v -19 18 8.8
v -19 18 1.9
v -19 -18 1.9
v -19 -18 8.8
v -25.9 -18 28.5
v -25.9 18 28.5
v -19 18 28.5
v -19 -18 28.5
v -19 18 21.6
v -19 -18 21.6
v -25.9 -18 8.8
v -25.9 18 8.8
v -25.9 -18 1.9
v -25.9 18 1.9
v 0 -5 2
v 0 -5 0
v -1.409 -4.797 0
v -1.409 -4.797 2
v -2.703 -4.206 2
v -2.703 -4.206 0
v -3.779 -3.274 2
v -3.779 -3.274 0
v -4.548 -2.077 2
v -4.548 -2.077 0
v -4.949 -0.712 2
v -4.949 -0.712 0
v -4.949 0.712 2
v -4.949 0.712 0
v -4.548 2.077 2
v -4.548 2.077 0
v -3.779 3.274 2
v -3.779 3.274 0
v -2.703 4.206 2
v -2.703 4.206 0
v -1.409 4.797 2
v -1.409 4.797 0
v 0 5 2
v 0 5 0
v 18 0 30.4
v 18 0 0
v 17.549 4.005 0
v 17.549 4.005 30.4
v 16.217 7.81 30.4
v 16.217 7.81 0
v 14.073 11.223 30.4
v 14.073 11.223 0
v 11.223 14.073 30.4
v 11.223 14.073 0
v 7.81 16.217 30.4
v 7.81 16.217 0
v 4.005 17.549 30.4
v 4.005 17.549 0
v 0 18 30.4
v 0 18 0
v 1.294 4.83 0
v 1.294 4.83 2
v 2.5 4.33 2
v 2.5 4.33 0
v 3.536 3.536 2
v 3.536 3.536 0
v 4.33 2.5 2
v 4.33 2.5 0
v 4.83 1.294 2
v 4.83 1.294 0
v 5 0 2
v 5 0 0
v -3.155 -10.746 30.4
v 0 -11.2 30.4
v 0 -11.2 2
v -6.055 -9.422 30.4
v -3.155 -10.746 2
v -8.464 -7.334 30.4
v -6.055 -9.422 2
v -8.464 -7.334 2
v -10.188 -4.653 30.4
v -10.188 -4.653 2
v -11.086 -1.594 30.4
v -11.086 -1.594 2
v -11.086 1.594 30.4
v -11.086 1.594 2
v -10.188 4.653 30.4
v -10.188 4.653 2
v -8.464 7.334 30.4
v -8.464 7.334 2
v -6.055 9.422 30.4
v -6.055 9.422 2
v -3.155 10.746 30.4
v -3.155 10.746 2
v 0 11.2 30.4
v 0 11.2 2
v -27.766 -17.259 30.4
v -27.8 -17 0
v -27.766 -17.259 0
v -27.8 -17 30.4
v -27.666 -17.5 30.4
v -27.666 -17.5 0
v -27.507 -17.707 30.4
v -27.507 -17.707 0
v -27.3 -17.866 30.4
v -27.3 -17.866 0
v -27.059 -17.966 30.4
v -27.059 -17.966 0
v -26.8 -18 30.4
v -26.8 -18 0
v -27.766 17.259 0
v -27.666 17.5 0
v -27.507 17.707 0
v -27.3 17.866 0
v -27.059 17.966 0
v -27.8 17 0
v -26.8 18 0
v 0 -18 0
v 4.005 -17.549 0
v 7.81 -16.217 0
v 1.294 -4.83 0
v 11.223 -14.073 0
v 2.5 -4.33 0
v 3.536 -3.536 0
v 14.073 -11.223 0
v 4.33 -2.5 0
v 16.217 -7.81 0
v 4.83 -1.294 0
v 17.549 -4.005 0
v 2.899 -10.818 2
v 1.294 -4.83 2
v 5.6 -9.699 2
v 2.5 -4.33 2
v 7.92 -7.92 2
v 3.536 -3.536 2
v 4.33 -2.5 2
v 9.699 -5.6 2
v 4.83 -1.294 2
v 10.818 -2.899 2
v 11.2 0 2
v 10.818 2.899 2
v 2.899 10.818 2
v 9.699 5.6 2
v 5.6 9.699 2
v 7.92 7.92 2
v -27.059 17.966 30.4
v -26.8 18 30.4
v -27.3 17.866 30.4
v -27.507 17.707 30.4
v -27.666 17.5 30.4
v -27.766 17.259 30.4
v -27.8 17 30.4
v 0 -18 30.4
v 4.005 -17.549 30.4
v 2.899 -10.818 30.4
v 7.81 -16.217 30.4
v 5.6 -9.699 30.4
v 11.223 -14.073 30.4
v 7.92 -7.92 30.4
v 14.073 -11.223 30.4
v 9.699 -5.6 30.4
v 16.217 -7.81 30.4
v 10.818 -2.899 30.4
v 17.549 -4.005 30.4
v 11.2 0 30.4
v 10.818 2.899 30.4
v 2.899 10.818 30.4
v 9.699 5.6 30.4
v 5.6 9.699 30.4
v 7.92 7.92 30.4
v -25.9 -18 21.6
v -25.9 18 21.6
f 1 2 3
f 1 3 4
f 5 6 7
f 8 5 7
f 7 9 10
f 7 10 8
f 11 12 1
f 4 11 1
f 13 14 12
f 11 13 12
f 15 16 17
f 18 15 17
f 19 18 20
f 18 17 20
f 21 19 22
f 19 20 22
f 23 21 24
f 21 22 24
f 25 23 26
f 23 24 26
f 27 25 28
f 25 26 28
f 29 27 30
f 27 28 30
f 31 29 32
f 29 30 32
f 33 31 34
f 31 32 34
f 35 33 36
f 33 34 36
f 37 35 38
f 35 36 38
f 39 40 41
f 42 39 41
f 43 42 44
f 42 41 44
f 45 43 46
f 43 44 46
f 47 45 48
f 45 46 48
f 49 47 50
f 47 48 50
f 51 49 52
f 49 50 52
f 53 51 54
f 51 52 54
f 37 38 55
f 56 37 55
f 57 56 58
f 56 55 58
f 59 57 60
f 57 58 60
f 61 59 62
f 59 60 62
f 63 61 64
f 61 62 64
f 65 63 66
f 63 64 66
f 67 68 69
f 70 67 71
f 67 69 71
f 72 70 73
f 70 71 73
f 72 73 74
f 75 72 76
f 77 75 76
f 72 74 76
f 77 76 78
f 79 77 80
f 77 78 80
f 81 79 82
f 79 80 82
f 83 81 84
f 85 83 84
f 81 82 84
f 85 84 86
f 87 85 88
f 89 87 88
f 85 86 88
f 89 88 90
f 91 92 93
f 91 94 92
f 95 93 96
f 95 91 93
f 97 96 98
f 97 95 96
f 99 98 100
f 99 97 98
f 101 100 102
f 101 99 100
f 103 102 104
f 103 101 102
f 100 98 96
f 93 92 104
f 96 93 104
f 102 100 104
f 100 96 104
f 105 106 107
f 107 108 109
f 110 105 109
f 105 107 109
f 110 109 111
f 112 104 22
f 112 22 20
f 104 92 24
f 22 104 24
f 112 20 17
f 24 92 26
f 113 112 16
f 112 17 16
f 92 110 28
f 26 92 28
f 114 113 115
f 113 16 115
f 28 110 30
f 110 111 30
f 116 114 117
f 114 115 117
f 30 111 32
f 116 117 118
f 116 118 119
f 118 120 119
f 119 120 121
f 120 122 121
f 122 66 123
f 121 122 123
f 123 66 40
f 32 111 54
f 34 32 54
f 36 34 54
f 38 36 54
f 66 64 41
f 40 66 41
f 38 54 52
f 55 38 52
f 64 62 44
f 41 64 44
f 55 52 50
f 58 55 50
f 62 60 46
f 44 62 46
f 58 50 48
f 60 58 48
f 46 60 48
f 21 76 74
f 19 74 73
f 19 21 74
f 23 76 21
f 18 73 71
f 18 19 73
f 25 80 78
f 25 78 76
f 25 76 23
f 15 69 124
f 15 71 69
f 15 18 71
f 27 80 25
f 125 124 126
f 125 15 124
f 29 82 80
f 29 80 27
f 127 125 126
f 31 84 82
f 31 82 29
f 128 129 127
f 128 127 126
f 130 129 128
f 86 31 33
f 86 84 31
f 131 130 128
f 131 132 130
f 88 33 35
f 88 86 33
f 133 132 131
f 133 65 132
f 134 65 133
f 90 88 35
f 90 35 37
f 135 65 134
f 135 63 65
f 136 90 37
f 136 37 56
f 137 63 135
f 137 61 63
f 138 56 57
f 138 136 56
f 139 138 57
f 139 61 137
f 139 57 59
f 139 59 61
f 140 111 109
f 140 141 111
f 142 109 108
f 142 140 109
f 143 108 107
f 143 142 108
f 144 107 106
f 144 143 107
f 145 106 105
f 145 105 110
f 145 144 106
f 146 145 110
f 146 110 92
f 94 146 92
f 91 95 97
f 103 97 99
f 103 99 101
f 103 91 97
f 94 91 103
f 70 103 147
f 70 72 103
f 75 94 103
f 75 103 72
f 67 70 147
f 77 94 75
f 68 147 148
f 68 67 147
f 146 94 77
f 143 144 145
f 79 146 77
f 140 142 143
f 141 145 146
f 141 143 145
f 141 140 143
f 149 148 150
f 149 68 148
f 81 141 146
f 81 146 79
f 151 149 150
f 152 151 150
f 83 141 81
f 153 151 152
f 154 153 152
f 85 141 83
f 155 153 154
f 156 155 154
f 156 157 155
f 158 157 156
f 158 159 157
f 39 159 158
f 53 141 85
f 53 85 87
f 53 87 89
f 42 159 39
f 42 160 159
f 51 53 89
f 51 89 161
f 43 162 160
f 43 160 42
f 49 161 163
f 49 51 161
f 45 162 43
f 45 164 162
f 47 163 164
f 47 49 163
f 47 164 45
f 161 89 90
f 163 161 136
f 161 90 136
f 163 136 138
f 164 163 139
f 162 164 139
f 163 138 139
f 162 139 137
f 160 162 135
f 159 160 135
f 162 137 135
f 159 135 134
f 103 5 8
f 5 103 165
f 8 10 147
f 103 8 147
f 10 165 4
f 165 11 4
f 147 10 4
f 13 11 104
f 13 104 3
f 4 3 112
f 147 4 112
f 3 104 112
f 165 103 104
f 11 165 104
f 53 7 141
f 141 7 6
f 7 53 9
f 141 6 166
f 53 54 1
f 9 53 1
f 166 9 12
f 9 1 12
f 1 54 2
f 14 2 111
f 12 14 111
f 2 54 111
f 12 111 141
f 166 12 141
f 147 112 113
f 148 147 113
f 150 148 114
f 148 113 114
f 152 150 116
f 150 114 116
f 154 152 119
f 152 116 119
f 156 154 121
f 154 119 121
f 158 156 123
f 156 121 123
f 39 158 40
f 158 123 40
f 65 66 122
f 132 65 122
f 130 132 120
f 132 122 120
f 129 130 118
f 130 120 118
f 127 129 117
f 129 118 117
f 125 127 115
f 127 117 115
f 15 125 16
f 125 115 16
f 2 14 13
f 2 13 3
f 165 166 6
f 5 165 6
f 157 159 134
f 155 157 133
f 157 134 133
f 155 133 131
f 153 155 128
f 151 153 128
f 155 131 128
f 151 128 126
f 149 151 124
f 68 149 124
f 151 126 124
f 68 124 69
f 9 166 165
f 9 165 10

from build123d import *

# Parameters (mm, degrees)
F1_DEPTH = 30.4
F2_DEPTH = 2
F3_W     = 6.9
F3_H     = 6.9
F4_DEPTH = 50
F5_R     = 1


# Not quite as in the source:
# - a feature of the source that left no trace in its solid (it failed there, or was rolled back) is left out
# - a feature names something its author has since deleted; it is built from what else it names


with BuildPart() as f1:
    # F0 (on Top) → F1 (new body)
    with BuildSketch(Plane.XY):
        with BuildLine():
            ThreePointArc((0, -18), (-18, 0), (0, 18))
            Line((0, 18), (-27.8, 18))
            Line((-27.8, 18), (-27.8, -18))
            Line((-27.8, -18), (0, -18))
        make_face()
        with BuildLine():
            ThreePointArc((0, -11.2), (-11.2, 0), (0, 11.2))
            Line((0, 11.2), (0, 18))
            ThreePointArc((0, 18), (-18, 0), (0, -18))
            Line((0, -18), (0, -11.2))
        make_face()
        with BuildLine():
            ThreePointArc((0, 11.2), (7.9195959493, 7.9195959493), (11.2, 0))
            ThreePointArc((11.2, 0), (7.9195959493, -7.9195959493), (0, -11.2))
            Line((0, -11.2), (0, -18))
            ThreePointArc((0, -18), (12.7279220614, -12.7279220614), (18, 0))
            ThreePointArc((18, 0), (12.7279220614, 12.7279220614), (0, 18))
            Line((0, 18), (0, 11.2))
        make_face()
    extrude(amount=F1_DEPTH)

    # F0 (on Top) → F2 (join)
    with BuildSketch(Plane.XY):
        with BuildLine():
            ThreePointArc((0, -11.2), (7.9195959493, -7.9195959493), (11.2, 0))
            ThreePointArc((11.2, 0), (7.9195959493, 7.9195959493), (0, 11.2))
            Line((0, 11.2), (0, 5))
            ThreePointArc((0, 5), (3.5355339059, 3.5355339059), (5, 0))
            ThreePointArc((5, 0), (3.5355339059, -3.5355339059), (0, -5))
            Line((0, -5), (0, -11.2))
        make_face()
        with BuildLine():
            Line((0, 5), (0, 11.2))
            ThreePointArc((0, 11.2), (-11.2, 0), (0, -11.2))
            Line((0, -11.2), (0, -5))
            ThreePointArc((0, -5), (-5, 0), (0, 5))
        make_face()
    extrude(amount=F2_DEPTH)

    # F3 (on face) → F4 (cut)
    with BuildSketch(Plane.XZ.offset(18)):
        with Locations((-22.45, 25.05)):
            Rectangle(F3_W, F3_H)
        with Locations((-22.45, 5.35)):
            Rectangle(F3_W, F3_H)
    extrude(amount=-F4_DEPTH, mode=Mode.SUBTRACT)

    # F5
    f5_edges = [f1.edges().sort_by_distance(p)[0] for p in [
        (-27.8, 18, 15.2),
        (-27.8, -18, 15.2),
    ]]
    fillet(f5_edges, radius=F5_R)


solid = f1.part
